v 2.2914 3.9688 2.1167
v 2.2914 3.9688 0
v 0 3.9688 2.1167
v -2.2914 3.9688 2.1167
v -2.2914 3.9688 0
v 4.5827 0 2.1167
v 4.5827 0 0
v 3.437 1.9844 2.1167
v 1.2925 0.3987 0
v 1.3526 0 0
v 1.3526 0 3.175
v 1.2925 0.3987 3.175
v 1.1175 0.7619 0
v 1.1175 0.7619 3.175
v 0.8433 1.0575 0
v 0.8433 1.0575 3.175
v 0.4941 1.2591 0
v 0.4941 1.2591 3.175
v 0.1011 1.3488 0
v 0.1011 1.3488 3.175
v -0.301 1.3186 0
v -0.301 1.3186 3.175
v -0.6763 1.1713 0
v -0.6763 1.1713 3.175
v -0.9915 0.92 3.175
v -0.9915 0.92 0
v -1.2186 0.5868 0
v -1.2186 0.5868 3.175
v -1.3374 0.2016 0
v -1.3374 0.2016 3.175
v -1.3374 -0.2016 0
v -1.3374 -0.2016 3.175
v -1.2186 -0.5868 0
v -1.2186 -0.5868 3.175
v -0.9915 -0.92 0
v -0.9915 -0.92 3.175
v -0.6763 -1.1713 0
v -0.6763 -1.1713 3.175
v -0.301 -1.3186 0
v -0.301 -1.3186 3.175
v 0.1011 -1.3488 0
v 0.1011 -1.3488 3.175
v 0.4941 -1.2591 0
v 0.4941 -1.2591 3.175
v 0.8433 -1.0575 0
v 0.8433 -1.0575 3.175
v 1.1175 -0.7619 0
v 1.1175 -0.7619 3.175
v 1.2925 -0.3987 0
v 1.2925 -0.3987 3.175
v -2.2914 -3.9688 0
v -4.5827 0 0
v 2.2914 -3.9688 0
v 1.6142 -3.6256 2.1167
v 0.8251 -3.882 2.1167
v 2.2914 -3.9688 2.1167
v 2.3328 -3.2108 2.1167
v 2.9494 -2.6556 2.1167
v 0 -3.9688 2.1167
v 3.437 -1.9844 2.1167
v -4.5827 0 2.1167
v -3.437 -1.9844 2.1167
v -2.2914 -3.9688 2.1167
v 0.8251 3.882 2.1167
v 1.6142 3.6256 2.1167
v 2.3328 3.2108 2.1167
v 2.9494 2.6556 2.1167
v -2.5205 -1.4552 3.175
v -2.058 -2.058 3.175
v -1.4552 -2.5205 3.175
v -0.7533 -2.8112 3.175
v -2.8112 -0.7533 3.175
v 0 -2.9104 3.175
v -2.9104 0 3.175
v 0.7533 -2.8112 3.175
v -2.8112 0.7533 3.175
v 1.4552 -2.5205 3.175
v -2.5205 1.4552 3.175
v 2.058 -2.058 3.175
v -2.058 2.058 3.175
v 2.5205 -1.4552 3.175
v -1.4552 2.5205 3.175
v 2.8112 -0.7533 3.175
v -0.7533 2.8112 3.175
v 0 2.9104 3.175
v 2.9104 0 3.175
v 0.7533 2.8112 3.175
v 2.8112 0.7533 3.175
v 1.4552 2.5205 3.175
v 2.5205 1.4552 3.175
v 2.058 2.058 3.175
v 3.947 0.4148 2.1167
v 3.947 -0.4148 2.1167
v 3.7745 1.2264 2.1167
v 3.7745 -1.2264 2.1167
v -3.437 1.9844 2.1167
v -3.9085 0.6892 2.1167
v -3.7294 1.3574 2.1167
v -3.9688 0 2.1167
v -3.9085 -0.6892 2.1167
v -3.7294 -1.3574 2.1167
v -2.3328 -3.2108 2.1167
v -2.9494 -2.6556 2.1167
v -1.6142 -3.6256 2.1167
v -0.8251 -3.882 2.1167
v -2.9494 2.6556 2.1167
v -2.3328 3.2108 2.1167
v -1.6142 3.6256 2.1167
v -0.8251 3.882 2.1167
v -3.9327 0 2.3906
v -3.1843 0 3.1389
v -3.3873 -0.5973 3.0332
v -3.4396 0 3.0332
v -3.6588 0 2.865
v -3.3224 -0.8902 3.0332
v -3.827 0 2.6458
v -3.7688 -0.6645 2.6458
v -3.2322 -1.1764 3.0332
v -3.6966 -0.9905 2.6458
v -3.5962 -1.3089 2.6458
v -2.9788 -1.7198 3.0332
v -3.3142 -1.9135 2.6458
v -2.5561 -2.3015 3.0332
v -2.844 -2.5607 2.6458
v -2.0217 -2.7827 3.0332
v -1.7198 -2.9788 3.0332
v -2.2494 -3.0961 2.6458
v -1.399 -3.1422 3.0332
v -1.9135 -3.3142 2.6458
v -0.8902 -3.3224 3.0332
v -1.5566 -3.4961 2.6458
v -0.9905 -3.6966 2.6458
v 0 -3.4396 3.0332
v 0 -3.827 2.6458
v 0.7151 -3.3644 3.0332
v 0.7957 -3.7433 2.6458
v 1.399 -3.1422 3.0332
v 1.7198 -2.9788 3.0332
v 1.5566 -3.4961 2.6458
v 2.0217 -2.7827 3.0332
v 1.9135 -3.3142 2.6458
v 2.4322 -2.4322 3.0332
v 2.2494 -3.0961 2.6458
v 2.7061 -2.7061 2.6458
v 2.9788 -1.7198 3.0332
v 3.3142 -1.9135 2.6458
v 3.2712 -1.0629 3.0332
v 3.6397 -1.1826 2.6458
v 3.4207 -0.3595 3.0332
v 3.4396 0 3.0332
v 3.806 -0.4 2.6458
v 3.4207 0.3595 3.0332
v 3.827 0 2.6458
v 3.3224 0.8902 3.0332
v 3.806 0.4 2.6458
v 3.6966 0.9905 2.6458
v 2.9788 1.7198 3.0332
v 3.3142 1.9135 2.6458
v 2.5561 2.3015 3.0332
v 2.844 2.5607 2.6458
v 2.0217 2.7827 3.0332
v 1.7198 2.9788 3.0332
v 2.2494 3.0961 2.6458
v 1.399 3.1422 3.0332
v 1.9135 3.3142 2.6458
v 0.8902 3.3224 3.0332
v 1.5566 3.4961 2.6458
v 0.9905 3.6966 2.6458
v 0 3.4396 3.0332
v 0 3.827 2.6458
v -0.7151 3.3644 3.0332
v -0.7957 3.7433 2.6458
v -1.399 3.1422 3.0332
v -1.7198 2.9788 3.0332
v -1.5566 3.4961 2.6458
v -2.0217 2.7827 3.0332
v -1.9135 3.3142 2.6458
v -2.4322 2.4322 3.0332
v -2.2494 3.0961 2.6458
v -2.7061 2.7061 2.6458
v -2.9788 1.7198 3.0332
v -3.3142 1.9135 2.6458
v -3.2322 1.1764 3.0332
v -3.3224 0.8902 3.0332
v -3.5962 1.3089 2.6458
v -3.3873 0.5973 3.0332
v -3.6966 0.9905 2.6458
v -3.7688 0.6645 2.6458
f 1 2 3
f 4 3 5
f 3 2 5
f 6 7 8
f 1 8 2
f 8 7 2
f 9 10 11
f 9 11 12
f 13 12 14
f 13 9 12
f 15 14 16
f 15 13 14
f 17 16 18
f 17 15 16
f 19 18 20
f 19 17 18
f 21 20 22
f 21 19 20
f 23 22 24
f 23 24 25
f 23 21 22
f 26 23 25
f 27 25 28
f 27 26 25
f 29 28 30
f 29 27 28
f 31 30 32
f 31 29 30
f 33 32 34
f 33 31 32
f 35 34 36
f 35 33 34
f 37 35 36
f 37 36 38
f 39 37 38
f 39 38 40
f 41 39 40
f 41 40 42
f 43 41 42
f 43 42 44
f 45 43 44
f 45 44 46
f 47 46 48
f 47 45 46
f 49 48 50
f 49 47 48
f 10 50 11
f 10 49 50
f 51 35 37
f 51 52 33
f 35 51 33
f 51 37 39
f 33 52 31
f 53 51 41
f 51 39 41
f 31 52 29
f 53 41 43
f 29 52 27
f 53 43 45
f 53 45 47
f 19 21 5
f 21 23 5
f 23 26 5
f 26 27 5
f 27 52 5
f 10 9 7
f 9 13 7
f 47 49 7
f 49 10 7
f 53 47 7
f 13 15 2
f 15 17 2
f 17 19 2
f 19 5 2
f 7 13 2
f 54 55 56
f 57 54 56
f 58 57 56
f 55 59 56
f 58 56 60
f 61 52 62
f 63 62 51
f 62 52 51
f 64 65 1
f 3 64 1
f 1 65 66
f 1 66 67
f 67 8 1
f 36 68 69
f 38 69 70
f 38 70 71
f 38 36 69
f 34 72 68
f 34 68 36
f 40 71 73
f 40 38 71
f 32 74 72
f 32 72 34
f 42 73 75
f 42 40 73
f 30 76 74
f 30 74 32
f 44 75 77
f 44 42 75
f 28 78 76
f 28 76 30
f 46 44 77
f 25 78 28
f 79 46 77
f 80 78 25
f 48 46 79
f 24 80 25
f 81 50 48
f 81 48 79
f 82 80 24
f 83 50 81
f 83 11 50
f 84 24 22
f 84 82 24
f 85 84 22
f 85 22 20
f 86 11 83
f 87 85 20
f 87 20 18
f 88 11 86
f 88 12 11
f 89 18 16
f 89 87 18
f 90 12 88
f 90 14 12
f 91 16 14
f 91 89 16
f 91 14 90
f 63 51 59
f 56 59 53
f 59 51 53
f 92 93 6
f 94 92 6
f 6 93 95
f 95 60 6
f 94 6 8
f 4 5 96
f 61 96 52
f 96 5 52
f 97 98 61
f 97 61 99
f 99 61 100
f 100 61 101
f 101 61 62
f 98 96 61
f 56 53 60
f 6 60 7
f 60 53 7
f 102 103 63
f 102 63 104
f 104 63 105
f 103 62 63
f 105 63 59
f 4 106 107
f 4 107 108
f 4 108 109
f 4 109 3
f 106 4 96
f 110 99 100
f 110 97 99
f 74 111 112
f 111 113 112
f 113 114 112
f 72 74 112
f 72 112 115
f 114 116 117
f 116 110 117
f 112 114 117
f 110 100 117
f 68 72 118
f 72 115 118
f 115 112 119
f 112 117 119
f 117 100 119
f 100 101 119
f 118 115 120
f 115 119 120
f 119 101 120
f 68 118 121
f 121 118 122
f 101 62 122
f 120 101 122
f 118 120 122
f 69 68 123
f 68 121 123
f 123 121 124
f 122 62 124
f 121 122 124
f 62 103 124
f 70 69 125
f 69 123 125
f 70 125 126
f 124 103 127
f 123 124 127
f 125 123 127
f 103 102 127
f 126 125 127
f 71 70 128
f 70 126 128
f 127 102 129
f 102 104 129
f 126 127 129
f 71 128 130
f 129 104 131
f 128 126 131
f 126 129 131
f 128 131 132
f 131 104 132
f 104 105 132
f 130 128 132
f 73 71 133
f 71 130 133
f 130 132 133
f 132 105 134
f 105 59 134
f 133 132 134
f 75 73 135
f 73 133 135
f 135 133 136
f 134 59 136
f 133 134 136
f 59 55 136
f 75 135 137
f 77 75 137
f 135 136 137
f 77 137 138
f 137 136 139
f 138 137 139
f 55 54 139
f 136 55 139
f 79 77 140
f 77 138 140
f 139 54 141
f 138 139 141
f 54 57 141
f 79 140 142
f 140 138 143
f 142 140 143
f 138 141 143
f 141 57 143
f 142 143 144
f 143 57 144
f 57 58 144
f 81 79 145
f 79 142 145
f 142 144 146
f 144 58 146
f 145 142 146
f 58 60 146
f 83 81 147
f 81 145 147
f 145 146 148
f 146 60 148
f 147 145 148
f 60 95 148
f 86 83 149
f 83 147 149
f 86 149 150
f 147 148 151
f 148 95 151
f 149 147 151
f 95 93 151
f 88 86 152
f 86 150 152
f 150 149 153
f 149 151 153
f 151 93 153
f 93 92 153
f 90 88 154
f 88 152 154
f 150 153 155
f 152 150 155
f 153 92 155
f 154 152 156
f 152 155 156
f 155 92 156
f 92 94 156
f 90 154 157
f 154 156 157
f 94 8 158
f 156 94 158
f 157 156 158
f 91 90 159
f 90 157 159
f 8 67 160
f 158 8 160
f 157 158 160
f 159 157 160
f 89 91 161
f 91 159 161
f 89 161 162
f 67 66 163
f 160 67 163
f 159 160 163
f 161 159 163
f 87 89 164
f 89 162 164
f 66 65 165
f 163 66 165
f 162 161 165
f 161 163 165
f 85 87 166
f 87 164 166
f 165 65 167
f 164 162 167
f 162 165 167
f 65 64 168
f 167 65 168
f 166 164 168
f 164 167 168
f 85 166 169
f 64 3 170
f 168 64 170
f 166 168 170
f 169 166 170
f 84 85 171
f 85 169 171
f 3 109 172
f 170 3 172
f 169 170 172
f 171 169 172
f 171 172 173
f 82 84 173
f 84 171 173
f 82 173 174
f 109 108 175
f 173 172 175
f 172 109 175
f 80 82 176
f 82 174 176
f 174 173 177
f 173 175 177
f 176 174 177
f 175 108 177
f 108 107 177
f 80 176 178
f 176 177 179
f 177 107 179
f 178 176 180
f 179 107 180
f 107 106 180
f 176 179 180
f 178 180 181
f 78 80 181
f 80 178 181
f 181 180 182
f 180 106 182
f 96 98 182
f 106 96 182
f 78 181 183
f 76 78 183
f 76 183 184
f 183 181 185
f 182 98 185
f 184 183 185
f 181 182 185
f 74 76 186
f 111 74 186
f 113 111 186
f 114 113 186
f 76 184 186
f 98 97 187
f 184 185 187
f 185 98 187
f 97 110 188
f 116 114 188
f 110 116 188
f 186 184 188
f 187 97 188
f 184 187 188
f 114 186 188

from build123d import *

# Parameters (mm, degrees)
SKETCH1_R           = 1.35255
BOSS_EXTRUDE1_DEPTH = 3.175


with BuildPart() as part:
    # Sketch1 → Boss-Extrude1 (new body)
    with BuildSketch(Plane.XY):
        Polygon((2.291358881, 3.96875), (-2.291358881, 3.96875), (-4.582717762, 0), (-2.291358881, -3.96875), (2.291358881, -3.96875), (4.582717762, 0), align=None)
        Circle(SKETCH1_R, mode=Mode.SUBTRACT)
    extrude(amount=BOSS_EXTRUDE1_DEPTH)

    # Sketch2 → Cut-Revolve2 (revolve, cut)
    with BuildSketch(Plane(origin=(0, 0, 0), x_dir=(0, 0, -1), z_dir=(1, 0, 0))):
        with BuildLine():
            Line((-3.175, 3.96875), (-3.175, 2.910416667))
            ThreePointArc((-3.175, 2.910416667), (-2.865021343, 3.658771343), (-2.116666667, 3.96875))
            Line((-2.116666667, 3.96875), (-2.116666667, 5.953125))
            Line((-2.116666667, 5.953125), (-3.175, 5.953125))
            Line((-3.175, 5.953125), (-3.175, 3.96875))
        make_face()
    revolve(axis=Axis((0, 0, -0.15875), (0, 0, 1)), mode=Mode.SUBTRACT)


solid = part.part
